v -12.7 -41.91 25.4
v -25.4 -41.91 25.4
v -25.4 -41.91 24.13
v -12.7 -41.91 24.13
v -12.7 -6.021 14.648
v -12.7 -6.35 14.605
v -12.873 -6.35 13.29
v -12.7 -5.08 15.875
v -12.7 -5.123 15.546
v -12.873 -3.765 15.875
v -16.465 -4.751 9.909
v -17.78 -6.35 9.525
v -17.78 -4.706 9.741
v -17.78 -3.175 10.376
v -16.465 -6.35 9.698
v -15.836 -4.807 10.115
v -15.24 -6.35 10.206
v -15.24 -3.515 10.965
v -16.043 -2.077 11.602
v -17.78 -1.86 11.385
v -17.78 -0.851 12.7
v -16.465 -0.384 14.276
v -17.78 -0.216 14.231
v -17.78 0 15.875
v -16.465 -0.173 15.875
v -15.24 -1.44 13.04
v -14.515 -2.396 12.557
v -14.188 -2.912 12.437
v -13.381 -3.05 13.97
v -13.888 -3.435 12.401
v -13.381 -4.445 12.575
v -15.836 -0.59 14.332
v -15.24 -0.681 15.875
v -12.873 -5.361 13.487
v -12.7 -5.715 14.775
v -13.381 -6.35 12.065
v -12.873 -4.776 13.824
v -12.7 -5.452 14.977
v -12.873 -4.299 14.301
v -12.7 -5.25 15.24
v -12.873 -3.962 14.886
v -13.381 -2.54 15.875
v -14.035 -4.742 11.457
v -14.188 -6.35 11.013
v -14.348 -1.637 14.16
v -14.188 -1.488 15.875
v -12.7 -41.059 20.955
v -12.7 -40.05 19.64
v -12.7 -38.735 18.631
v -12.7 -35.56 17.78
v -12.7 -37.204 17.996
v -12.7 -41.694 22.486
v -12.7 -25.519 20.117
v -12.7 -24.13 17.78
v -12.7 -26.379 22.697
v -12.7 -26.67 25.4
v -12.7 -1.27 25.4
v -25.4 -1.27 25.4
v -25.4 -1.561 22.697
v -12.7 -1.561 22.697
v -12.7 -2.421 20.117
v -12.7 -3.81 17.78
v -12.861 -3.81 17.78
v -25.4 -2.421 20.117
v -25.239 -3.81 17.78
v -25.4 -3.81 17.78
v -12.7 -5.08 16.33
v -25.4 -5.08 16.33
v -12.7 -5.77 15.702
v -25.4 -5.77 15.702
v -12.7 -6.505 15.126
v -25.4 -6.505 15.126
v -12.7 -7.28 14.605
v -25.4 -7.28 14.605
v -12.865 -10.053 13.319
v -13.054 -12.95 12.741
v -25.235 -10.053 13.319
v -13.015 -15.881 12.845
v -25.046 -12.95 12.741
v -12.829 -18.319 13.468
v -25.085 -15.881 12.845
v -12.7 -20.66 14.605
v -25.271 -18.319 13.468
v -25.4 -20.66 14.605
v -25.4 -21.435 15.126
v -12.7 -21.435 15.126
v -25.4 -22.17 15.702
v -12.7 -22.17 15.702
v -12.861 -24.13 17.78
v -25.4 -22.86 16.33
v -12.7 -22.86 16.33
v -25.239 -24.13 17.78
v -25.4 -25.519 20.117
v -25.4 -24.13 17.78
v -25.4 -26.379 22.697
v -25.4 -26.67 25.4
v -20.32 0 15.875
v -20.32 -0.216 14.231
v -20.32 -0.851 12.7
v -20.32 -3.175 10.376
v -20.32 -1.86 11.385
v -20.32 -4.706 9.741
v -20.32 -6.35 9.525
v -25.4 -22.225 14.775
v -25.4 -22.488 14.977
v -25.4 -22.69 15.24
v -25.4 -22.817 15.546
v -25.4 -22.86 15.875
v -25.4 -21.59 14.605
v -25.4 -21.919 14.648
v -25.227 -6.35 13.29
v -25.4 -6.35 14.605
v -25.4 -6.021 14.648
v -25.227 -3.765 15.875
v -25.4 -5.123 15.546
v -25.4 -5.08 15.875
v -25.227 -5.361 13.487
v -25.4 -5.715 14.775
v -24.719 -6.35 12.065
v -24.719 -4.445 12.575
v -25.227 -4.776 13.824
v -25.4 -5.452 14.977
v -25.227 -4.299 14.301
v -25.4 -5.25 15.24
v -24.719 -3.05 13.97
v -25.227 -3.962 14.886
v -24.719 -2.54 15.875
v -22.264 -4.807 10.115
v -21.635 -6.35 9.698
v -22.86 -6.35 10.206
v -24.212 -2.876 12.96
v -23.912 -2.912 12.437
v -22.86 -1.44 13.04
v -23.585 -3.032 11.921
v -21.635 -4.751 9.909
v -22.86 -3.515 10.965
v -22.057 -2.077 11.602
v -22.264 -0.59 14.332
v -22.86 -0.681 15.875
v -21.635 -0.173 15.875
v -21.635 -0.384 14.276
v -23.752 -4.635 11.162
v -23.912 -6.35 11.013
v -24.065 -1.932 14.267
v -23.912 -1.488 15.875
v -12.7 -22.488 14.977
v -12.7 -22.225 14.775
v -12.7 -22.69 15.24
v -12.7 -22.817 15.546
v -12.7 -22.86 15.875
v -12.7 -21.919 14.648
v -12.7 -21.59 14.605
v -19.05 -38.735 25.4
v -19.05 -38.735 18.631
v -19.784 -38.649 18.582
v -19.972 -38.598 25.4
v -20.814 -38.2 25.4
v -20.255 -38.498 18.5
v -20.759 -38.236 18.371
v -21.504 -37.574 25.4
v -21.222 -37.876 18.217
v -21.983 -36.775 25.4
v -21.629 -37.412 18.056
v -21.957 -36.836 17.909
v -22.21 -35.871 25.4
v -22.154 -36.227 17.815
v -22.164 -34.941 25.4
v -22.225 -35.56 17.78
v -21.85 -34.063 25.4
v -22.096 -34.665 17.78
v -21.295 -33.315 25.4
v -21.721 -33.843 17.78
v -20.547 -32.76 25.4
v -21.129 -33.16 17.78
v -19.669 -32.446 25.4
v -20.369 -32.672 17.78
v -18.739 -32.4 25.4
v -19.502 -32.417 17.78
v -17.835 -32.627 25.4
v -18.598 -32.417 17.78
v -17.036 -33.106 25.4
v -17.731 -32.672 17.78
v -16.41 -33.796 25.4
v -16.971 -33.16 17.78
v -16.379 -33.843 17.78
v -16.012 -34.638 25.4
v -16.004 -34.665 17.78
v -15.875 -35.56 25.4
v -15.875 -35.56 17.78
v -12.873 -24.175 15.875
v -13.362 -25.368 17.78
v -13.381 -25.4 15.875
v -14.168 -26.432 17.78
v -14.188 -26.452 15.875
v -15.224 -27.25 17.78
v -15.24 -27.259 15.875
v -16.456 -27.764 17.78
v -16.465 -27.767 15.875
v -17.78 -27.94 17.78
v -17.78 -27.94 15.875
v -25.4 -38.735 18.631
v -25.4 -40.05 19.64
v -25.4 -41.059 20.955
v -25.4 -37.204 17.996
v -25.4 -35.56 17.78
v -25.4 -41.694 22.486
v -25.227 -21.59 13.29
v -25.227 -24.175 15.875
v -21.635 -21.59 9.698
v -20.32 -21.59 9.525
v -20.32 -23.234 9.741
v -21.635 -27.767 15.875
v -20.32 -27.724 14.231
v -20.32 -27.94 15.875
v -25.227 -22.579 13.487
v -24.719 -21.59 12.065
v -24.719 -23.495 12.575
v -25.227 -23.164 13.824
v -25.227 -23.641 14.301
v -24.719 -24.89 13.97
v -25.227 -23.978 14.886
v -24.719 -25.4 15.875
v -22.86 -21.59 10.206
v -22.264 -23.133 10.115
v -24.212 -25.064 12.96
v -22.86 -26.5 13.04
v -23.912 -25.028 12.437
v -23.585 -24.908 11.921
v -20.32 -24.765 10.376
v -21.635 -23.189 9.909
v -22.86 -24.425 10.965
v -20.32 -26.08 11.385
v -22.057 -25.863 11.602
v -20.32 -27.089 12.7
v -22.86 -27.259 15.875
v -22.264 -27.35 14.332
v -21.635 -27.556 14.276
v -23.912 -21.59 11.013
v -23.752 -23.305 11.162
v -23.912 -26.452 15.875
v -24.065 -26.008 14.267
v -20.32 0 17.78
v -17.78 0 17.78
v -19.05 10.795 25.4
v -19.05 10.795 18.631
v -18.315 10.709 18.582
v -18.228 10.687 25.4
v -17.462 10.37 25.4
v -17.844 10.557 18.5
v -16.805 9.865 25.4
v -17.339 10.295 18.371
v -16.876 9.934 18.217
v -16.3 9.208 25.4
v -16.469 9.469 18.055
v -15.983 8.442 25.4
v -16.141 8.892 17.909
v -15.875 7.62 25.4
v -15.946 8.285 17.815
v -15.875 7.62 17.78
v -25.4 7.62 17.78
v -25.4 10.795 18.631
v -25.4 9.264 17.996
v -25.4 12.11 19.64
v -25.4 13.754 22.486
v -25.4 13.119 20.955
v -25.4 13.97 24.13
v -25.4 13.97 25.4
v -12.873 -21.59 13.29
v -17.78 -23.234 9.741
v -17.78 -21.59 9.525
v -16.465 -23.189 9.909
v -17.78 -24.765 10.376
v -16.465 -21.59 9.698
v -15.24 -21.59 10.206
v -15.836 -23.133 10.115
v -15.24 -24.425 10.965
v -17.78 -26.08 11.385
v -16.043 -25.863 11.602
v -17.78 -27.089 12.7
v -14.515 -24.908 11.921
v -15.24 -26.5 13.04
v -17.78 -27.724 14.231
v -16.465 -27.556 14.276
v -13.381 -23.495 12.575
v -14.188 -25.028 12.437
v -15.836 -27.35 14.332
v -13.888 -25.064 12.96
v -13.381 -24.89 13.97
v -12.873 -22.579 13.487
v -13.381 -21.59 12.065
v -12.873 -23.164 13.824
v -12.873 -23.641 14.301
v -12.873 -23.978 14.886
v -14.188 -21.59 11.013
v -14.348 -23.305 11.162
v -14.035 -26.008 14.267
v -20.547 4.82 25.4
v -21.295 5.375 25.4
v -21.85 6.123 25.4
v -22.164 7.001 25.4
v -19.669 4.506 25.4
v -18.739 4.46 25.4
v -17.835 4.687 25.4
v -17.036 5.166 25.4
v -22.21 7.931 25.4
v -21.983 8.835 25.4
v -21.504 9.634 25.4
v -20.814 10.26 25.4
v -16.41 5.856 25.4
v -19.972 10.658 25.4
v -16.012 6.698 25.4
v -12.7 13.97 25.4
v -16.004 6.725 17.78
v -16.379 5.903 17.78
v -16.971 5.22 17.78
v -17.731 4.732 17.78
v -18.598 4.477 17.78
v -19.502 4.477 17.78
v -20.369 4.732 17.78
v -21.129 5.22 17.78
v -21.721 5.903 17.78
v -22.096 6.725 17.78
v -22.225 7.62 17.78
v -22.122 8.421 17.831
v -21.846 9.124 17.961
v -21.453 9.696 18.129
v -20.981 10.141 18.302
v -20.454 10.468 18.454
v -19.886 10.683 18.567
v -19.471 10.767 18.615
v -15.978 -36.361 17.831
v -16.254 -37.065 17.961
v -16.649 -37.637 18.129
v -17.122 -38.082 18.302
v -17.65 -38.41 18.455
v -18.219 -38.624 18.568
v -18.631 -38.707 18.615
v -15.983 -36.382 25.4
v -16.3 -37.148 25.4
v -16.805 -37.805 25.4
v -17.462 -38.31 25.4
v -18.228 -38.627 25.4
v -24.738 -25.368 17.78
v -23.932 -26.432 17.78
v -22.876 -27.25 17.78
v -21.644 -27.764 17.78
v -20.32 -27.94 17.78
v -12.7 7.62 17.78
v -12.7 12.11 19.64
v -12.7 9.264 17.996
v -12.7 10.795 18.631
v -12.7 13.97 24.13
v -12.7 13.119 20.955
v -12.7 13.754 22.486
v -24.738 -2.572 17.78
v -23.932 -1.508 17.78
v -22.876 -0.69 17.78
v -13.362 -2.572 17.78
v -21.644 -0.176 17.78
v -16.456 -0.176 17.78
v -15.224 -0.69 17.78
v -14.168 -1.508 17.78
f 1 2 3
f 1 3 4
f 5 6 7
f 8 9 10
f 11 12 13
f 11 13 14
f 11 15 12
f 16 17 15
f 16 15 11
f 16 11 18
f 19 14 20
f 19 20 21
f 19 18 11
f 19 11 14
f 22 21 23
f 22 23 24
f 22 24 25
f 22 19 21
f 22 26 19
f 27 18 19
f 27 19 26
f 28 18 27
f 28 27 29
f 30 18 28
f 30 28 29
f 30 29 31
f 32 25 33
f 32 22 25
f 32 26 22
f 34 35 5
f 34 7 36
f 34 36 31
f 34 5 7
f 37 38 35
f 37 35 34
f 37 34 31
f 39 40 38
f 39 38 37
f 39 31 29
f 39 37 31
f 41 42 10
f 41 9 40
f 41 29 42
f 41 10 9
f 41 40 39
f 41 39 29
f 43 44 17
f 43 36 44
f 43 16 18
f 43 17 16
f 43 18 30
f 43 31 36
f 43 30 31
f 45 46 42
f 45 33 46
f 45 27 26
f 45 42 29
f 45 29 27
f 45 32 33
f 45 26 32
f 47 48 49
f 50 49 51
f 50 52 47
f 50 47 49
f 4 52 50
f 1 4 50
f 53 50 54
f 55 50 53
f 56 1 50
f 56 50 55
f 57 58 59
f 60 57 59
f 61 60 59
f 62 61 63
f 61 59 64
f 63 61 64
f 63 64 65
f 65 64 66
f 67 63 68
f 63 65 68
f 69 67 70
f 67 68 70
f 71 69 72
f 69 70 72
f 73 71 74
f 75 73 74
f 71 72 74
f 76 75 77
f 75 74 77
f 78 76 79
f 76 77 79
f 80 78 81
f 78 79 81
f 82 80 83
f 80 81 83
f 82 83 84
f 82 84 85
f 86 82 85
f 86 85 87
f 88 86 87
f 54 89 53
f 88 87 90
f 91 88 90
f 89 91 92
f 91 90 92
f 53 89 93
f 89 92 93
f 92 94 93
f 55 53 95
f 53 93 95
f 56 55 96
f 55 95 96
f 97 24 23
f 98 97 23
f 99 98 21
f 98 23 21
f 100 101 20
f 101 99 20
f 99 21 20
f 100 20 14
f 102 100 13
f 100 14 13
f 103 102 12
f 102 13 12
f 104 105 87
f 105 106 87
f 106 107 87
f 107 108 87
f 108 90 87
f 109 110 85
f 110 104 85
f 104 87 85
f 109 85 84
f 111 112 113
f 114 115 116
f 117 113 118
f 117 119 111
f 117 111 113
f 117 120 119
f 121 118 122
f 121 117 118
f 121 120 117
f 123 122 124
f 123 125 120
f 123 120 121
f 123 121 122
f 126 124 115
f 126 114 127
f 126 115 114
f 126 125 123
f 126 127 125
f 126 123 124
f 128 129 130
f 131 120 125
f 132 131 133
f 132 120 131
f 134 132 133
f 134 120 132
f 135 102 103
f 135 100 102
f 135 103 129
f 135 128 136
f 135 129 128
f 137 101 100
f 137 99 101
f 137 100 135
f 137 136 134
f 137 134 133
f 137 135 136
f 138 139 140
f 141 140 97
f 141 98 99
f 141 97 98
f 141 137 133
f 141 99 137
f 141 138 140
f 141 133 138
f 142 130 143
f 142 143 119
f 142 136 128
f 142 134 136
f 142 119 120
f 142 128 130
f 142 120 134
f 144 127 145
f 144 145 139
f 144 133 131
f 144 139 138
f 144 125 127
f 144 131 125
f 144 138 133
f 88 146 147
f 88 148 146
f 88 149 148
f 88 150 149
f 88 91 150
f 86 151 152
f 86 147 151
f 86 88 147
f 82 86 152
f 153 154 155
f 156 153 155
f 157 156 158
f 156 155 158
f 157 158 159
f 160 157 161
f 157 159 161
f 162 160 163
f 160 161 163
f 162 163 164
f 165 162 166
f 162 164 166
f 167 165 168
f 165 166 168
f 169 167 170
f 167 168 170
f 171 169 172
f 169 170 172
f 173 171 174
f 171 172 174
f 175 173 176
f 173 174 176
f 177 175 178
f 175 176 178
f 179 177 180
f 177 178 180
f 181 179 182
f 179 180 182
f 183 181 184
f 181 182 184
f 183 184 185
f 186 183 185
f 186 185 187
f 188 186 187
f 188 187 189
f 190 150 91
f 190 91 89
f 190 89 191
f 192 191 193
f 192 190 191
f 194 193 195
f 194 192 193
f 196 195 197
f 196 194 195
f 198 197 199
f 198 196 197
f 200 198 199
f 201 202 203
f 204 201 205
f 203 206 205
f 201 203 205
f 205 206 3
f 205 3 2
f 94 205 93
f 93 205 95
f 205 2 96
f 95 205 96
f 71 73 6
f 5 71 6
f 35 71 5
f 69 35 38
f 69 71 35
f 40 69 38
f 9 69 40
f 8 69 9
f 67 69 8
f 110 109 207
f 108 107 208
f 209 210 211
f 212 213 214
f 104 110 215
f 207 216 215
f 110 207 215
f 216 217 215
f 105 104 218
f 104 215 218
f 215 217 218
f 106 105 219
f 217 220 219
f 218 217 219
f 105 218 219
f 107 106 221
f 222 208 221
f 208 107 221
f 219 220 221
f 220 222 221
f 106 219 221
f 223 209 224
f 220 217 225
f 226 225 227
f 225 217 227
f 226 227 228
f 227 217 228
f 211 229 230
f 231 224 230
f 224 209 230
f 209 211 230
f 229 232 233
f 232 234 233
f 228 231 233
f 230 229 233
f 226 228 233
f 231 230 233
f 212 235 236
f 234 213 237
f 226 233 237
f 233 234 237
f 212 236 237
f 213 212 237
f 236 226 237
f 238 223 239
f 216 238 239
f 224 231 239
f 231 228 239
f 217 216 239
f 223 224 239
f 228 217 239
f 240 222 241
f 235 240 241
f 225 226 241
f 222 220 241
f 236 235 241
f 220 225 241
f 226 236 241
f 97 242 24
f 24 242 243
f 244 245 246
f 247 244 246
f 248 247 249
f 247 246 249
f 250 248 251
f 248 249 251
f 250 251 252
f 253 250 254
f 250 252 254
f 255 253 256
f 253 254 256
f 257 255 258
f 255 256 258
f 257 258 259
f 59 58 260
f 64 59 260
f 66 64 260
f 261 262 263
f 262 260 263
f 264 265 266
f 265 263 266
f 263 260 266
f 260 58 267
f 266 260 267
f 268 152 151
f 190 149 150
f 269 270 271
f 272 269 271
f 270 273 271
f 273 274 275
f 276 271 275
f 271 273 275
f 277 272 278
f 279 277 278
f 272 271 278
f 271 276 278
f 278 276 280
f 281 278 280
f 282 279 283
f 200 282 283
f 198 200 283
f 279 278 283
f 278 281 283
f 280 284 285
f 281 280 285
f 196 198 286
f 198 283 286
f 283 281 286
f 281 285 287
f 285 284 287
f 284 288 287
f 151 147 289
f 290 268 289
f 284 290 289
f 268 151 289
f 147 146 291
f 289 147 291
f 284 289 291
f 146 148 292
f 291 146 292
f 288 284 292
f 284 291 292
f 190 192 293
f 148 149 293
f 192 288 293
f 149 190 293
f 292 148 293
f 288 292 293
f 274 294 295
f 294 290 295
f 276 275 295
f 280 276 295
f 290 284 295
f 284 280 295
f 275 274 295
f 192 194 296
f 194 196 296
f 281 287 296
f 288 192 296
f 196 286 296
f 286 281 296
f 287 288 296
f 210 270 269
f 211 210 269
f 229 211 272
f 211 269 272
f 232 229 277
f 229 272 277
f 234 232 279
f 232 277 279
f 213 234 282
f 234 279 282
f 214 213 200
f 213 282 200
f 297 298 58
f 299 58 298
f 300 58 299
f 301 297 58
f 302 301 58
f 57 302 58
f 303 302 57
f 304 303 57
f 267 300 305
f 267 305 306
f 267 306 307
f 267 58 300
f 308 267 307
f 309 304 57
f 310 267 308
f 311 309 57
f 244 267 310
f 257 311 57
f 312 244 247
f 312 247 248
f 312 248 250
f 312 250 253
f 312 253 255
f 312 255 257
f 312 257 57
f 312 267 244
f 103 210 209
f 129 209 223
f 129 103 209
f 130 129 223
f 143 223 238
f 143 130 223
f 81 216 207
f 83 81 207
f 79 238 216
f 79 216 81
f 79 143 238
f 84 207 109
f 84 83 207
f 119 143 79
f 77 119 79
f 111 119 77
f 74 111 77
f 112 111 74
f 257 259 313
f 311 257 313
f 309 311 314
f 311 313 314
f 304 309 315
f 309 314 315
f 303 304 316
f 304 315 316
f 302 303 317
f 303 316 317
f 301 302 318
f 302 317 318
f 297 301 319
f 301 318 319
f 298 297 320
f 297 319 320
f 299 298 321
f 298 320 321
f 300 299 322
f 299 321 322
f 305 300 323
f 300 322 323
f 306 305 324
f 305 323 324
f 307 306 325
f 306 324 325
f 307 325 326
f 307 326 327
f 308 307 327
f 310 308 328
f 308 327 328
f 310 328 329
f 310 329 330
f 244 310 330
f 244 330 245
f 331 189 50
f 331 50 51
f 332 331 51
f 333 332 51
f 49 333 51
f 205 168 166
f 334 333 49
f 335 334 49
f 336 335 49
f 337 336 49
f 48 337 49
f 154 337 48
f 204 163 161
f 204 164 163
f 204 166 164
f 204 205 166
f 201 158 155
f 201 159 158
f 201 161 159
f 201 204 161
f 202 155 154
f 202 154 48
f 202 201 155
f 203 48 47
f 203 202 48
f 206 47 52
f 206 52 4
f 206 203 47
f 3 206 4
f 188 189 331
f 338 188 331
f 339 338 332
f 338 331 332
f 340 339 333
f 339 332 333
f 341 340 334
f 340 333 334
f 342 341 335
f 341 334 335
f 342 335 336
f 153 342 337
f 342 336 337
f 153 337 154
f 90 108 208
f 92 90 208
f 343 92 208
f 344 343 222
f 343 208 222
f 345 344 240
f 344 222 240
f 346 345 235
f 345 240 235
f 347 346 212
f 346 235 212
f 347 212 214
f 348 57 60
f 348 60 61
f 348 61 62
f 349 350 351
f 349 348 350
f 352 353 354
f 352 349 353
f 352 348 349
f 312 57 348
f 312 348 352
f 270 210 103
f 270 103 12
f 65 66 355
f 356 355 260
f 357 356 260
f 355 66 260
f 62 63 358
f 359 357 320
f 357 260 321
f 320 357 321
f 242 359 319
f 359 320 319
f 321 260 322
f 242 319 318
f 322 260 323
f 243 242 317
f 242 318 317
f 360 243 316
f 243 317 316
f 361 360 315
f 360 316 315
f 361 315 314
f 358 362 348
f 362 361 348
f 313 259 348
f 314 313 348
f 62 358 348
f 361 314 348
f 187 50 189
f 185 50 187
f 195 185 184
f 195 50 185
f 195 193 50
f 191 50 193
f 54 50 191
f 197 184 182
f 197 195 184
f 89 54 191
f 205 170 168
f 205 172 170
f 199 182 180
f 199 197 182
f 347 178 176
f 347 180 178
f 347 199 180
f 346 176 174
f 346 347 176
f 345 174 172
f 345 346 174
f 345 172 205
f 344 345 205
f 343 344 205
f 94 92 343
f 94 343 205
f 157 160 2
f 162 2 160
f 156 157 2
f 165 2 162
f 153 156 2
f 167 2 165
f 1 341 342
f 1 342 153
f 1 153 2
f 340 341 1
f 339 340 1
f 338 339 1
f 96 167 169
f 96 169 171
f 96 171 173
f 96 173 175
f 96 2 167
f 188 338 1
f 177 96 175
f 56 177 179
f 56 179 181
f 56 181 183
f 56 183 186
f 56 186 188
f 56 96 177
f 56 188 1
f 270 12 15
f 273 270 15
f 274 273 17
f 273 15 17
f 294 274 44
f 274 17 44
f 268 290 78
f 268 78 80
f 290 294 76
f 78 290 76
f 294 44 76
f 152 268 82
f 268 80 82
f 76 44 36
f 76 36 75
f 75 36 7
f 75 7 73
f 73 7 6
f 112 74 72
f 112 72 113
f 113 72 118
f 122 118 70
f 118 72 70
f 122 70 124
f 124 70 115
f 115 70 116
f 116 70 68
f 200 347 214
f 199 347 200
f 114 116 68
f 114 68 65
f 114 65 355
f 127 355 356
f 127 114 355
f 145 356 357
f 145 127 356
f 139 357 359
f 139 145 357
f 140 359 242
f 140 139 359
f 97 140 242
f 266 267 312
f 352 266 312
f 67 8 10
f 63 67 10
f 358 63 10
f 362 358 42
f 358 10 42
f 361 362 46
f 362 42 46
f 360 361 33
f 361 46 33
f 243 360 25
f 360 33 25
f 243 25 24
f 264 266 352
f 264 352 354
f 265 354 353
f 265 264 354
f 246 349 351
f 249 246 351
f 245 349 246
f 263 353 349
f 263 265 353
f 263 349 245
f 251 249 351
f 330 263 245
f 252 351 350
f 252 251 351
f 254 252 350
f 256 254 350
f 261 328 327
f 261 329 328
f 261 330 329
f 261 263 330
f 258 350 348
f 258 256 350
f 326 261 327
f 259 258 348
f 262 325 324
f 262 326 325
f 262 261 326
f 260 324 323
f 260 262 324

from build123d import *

# Parameters (mm, degrees)
F0_W          = 12.7
F0_H          = 3.175
F0_H_2        = 12.7
F1_DEPTH      = 27.94
F2_W          = 12.7
F2_H          = 10.9347
F2_H_2        = 3.0353
F3_DEPTH      = 7.62
F4_W          = 12.7
F4_H          = 13.97
F5_DEPTH      = 7.62
F7_DEPTH      = 25.4
F10_DEPTH     = 25.4
F11_T1_DEPTH  = 44.45
F12_R         = 6.35
F13_R         = 6.35
F14_T1_DEPTH  = 15.24
F14_T3_DEPTH  = 1.905
F14_T6_ANGLE  = 90
F14_T8_ANGLE  = 90
F14_T10_ANGLE = 90
F14_T12_ANGLE = 90


# Not quite as in the source:
# - a fillet or chamfer that OpenCascade refuses, or shapes differently, is made with other operations: its cross-section is extruded or revolved along the edge and cut away or added


with BuildPart() as f1:
    # F0 (on Front) → F1 (new body)
    with BuildSketch(Plane.XZ):
        with Locations((-19.05, 11.1125)):
            Rectangle(F0_W, F0_H)
        with Locations((-19.05, 19.05)):
            Rectangle(F0_W, F0_H_2)
    extrude(amount=F1_DEPTH)

    # F2 (on face) → F3 (join)
    with BuildSketch(Plane.XY.offset(25.4)):
        with Locations((-19.05, -33.40735)):
            Rectangle(F2_W, F2_H)
        with Locations((-19.05, -40.39235)):
            Rectangle(F2_W, F2_H_2)
    extrude(amount=-F3_DEPTH)

    # F4 (on face) → F5 (join)
    with BuildSketch(Plane.XY.offset(25.4)):
        with Locations((-19.05, 6.985)):
            Rectangle(F4_W, F4_H)
    extrude(amount=-F5_DEPTH)

    # F6 (on face) → F7 (cut)
    with BuildSketch(Plane(origin=(-25.4, 0, 0), x_dir=(0, -1, 0), z_dir=(-1, 0, 0))):
        with BuildLine():
            ThreePointArc((1.27, 25.4), (13.97, 12.7), (26.67, 25.4))
            Line((26.67, 25.4), (1.27, 25.4))
        make_face()
    extrude(amount=-F7_DEPTH, mode=Mode.SUBTRACT)

    # F8 (on face) + F9 (on face) → F10 (cut)
    with BuildSketch(Plane(origin=(0, 0, 17.78), x_dir=(1, 0, 0), z_dir=(0, 0, -1))):
        with BuildLine():
            ThreePointArc((-19.05, 38.735), (-21.2950640303, 33.3149359697), (-15.875, 35.56))
            ThreePointArc((-15.875, 35.56), (-16.8049359697, 37.8050640303), (-19.05, 38.735))
        make_face()
    with BuildSketch(Plane(origin=(0, 0, 17.78), x_dir=(1, 0, 0), z_dir=(0, 0, -1))):
        with BuildLine():
            ThreePointArc((-19.05, -10.795), (-16.8049359697, -9.8650640303), (-15.875, -7.62))
            ThreePointArc((-15.875, -7.62), (-21.2950640303, -5.3749359697), (-19.05, -10.795))
        make_face()
    extrude(amount=-F10_DEPTH, mode=Mode.SUBTRACT)

    # F11: fillet of radius 6.35 on 2 edges, made by hand

    # F11_s2 → F11_t1 (cut)
    with BuildSketch(Plane.YZ.offset(-41.275)):
        with BuildLine():
            ThreePointArc((-35.56, 17.78), (-40.0501280605, 19.6398719395), (-41.91, 24.13))
            Line((-41.91, 24.13), (-41.91, 17.78))
            Line((-41.91, 17.78), (-35.56, 17.78))
        make_face()
        with BuildLine():
            ThreePointArc((13.97, 24.13), (12.1101280605, 19.6398719395), (7.62, 17.78))
            Line((7.62, 17.78), (13.97, 17.78))
            Line((13.97, 17.78), (13.97, 24.13))
        make_face()
    extrude(amount=F11_T1_DEPTH, mode=Mode.SUBTRACT)

    # F12
    f12_edges = [f1.edges().sort_by_distance(p)[0] for p in [
        (-19.05, 0, 9.525),
    ]]
    fillet(f12_edges, radius=F12_R)

    # F13
    f13_edges = [f1.edges().sort_by_distance(p)[0] for p in [
        (-19.05, -27.94, 9.525),
    ]]
    fillet(f13_edges, radius=F13_R)

    # F14: fillet of radius 5.08 on 2 edges, made by hand

    # F14_s2 → F14_t1 (cut)
    with BuildSketch(Plane.XZ.offset(6.35)):
        with BuildLine():
            ThreePointArc((-17.78, 9.525), (-14.1878975516, 11.0128975516), (-12.7, 14.605))
            Line((-12.7, 14.605), (-12.7, 9.525))
            Line((-12.7, 9.525), (-17.78, 9.525))
        make_face()
        with BuildLine():
            ThreePointArc((-20.32, 9.525), (-23.9121024484, 11.0128975516), (-25.4, 14.605))
            Line((-25.4, 14.605), (-25.4, 9.525))
            Line((-25.4, 9.525), (-20.32, 9.525))
        make_face()
    extrude(amount=F14_T1_DEPTH, mode=Mode.SUBTRACT)

    # F14_s4 → F14_t3 (cut)
    with BuildSketch(Plane.XY.offset(15.875)):
        with BuildLine():
            ThreePointArc((-25.4, -22.86), (-23.9121024484, -26.4521024484), (-20.32, -27.94))
            Line((-20.32, -27.94), (-25.4, -27.94))
            Line((-25.4, -27.94), (-25.4, -22.86))
        make_face()
        with BuildLine():
            ThreePointArc((-25.4, -5.08), (-23.9121024484, -1.4878975516), (-20.32, 0))
            Line((-20.32, 0), (-25.4, 0))
            Line((-25.4, 0), (-25.4, -5.08))
        make_face()
        with BuildLine():
            ThreePointArc((-12.7, -22.86), (-14.1878975516, -26.4521024484), (-17.78, -27.94))
            Line((-17.78, -27.94), (-12.7, -27.94))
            Line((-12.7, -27.94), (-12.7, -22.86))
        make_face()
        with BuildLine():
            ThreePointArc((-12.7, -5.08), (-14.1878975516, -1.4878975516), (-17.78, 0))
            Line((-17.78, 0), (-12.7, 0))
            Line((-12.7, 0), (-12.7, -5.08))
        make_face()
    extrude(amount=F14_T3_DEPTH, mode=Mode.SUBTRACT)

    # F14_s5 → F14_t6 (revolve, cut)
    with BuildSketch(Plane.XZ.offset(6.35)):
        with BuildLine():
            ThreePointArc((-25.4, 14.605), (-23.9121024484, 11.0128975516), (-20.32, 9.525))
            Line((-20.32, 9.525), (-25.4, 9.525))
            Line((-25.4, 9.525), (-25.4, 14.605))
        make_face()
    revolve(axis=Axis((-25.4, -6.35, 15.875), (1, 0, 0)), revolution_arc=F14_T6_ANGLE, mode=Mode.SUBTRACT)

    # F14_s7 → F14_t8 (revolve, cut)
    with BuildSketch(Plane.XZ.offset(21.59)):
        with BuildLine():
            ThreePointArc((-25.4, 14.605), (-23.9121024484, 11.0128975516), (-20.32, 9.525))
            Line((-20.32, 9.525), (-25.4, 9.525))
            Line((-25.4, 9.525), (-25.4, 14.605))
        make_face()
    revolve(axis=Axis((-25.4, -21.59, 15.875), (-1, 0, 0)), revolution_arc=F14_T8_ANGLE, mode=Mode.SUBTRACT)

    # F14_s9 → F14_t10 (revolve, cut)
    with BuildSketch(Plane.XZ.offset(6.35)):
        with BuildLine():
            ThreePointArc((-17.78, 9.525), (-14.1878975516, 11.0128975516), (-12.7, 14.605))
            Line((-12.7, 14.605), (-12.7, 9.525))
            Line((-12.7, 9.525), (-17.78, 9.525))
        make_face()
    revolve(axis=Axis((-12.7, -6.35, 15.875), (1, 0, 0)), revolution_arc=F14_T10_ANGLE, mode=Mode.SUBTRACT)

    # F14_s11 → F14_t12 (revolve, cut)
    with BuildSketch(Plane.XZ.offset(21.59)):
        with BuildLine():
            ThreePointArc((-17.78, 9.525), (-14.1878975516, 11.0128975516), (-12.7, 14.605))
            Line((-12.7, 14.605), (-12.7, 9.525))
            Line((-12.7, 9.525), (-17.78, 9.525))
        make_face()
    revolve(axis=Axis((-12.7, -21.59, 15.875), (-1, 0, 0)), revolution_arc=F14_T12_ANGLE, mode=Mode.SUBTRACT)


solid = f1.part
